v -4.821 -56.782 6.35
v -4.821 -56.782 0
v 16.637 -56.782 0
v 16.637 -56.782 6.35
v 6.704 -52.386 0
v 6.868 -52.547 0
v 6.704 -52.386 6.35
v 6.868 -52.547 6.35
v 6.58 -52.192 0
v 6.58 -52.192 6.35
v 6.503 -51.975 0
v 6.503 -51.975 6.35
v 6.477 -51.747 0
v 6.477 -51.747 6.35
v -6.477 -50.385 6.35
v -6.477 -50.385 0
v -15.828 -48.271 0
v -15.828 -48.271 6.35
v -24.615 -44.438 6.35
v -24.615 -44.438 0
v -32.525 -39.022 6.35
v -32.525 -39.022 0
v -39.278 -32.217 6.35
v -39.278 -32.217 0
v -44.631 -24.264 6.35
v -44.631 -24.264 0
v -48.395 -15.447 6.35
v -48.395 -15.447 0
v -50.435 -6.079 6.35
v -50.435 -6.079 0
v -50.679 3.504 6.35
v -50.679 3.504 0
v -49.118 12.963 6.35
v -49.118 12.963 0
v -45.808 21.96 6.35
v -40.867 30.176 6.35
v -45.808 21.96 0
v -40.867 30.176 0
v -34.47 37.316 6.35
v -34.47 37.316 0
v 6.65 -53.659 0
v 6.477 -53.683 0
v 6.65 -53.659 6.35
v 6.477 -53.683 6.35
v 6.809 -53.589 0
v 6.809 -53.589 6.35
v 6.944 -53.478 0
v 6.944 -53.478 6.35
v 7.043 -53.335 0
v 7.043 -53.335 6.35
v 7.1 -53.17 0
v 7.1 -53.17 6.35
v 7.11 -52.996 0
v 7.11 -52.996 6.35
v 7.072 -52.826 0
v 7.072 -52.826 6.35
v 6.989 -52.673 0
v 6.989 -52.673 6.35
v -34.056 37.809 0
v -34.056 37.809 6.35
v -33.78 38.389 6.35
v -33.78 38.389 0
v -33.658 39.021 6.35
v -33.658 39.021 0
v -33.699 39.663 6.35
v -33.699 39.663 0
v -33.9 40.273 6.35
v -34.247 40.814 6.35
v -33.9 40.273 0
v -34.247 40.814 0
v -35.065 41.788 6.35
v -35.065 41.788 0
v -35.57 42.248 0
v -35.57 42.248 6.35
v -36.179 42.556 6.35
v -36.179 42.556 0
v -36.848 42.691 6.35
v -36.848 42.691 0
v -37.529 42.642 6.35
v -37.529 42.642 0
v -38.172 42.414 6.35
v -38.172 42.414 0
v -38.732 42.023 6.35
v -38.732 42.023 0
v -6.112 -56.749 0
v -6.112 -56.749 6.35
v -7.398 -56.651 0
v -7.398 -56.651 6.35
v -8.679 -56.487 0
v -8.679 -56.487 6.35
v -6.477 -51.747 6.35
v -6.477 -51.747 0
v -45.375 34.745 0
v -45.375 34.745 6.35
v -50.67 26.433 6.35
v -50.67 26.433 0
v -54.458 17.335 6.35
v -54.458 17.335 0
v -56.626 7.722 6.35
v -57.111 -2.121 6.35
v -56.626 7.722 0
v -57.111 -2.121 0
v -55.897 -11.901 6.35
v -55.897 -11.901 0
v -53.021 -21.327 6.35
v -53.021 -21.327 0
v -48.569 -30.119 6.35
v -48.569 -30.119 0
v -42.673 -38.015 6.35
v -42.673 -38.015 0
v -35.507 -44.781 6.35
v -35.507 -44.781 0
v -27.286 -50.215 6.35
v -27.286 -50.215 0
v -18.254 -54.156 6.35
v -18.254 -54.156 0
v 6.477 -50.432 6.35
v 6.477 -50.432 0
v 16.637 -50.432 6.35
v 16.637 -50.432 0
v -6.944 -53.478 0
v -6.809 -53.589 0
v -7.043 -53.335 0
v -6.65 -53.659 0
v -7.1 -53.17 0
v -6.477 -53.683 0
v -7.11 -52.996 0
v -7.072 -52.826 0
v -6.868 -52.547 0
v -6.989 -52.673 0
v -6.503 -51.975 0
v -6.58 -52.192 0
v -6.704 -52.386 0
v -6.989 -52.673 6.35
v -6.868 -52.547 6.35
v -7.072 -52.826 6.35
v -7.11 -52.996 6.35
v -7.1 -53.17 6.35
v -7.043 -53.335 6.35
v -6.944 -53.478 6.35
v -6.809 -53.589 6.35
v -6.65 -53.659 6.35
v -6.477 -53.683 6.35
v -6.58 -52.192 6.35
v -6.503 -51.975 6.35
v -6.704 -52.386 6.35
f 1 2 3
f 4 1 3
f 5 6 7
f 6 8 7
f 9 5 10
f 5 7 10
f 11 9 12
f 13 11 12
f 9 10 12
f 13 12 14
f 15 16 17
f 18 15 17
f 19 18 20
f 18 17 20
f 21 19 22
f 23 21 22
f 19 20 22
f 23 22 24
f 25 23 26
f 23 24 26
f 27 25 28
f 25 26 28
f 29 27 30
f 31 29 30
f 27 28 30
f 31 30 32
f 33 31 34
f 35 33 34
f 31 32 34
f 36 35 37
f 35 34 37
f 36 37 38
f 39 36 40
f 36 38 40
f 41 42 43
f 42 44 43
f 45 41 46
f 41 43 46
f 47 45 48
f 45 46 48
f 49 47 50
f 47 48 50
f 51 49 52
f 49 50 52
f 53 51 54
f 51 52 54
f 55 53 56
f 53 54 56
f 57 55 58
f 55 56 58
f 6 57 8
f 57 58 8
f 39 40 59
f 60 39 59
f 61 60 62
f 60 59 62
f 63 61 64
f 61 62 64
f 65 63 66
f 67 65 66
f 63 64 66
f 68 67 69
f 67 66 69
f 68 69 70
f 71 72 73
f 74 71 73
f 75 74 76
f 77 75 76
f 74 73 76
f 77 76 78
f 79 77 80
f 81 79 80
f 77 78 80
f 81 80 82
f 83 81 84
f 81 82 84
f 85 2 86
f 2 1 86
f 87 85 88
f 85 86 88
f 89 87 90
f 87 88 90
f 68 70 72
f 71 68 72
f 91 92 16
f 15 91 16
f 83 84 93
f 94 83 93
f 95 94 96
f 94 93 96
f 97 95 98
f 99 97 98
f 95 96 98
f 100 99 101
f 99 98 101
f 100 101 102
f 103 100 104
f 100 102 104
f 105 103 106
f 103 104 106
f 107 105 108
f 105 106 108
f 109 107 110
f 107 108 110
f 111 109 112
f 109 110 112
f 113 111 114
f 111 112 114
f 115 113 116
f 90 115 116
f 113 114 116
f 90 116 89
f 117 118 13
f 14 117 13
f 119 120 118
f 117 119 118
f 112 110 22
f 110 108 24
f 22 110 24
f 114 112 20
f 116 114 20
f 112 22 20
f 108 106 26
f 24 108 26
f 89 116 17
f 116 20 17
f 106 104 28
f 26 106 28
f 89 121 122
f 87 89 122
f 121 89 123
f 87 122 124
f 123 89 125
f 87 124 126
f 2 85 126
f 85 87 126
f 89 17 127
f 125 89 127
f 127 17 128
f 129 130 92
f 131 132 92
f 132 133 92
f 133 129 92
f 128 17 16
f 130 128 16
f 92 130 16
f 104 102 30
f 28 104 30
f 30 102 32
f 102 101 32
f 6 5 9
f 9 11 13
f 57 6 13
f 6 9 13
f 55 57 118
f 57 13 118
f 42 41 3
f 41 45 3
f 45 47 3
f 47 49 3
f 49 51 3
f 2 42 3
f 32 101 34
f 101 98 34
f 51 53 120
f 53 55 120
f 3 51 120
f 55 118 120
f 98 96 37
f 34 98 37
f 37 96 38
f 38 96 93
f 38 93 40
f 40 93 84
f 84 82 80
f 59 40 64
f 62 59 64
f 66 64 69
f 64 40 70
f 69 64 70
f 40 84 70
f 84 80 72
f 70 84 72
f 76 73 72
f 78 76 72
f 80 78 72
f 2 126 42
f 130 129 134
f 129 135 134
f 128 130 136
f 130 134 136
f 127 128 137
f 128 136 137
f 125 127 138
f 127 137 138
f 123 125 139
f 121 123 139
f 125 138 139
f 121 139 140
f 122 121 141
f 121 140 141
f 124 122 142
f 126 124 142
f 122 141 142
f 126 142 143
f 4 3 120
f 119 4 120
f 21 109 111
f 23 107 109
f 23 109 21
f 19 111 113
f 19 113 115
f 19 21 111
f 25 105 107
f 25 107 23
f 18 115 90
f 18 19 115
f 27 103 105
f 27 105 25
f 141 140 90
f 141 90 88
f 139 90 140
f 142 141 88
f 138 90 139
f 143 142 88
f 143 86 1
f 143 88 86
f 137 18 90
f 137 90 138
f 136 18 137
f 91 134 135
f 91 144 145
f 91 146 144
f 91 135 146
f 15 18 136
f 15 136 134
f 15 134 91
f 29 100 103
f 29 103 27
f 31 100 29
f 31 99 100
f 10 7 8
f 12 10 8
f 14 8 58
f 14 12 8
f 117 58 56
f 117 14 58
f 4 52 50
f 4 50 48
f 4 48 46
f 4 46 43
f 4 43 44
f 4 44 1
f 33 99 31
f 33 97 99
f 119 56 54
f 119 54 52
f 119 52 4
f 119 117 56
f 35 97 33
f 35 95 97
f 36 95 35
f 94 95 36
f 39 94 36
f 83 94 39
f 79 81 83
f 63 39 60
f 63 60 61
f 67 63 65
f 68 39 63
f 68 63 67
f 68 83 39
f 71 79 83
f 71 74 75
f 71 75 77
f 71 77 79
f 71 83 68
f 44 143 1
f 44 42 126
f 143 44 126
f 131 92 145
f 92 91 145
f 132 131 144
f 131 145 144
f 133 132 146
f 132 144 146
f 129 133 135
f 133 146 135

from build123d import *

# Parameters (mm, degrees)
BOSS_EXTRUDE1_DEPTH = 6.35
SKETCH2_R           = 0.635
CUT_EXTRUDE1_DEPTH  = 7.35
FILLET2_R           = 1.016
FILLET3_R           = 25.4


with BuildPart() as part:
    # Sketch1 → Boss-Extrude1 (new body)
    with BuildSketch(Plane.XY):
        with BuildLine():
            ThreePointArc((-38.731808071, 42.023440406), (-54.328419489, -17.735426012), (-6.477, -56.781783796))
            Line((-6.477, -56.781783796), (6.477, -56.781783796))
            Line((6.477, -56.781783796), (16.637, -56.781783796))
            Line((16.637, -56.781783796), (16.637, -50.431783796))
            Line((16.637, -50.431783796), (6.477, -50.431783796))
            Line((6.477, -50.431783796), (6.477, -53.682983796))
            Line((6.477, -53.682983796), (-6.477, -53.682983796))
            Line((-6.477, -53.682983796), (-6.477, -50.385399383))
            ThreePointArc((-6.477, -50.385399383), (-48.394630123, -15.446675216), (-34.469665313, 37.315977453))
            ThreePointArc((-34.469665313, 37.315977453), (-33.658259426, 39.020726685), (-34.247395693, 40.814456854))
            Line((-34.247395693, 40.814456854), (-35.064641493, 41.788412472))
            ThreePointArc((-35.064641493, 41.788412472), (-36.847939613, 42.690531433), (-38.731808071, 42.023440406))
        make_face()
    extrude(amount=BOSS_EXTRUDE1_DEPTH)

    # Sketch2 → Cut-Extrude1 (cut, through all)
    with BuildSketch(Plane.XY.offset(6.35)):
        with Locations((-6.477, -53.047983796)):
            Circle(SKETCH2_R)
        with Locations((6.477, -53.047983796)):
            Circle(SKETCH2_R)
    extrude(amount=-CUT_EXTRUDE1_DEPTH, mode=Mode.SUBTRACT)

    # Fillet2
    fillet2_edges = [part.edges().sort_by_distance(p)[0] for p in [
        (-6.477, -52.412983796, 3.175),
        (6.477, -52.412983796, 3.175),
    ]]
    fillet(fillet2_edges, radius=FILLET2_R)

    # Fillet3
    fillet3_edges = [part.edges().sort_by_distance(p)[0] for p in [
        (-6.477, -56.781783796, 3.175),
    ]]
    fillet(fillet3_edges, radius=FILLET3_R)


solid = part.part
